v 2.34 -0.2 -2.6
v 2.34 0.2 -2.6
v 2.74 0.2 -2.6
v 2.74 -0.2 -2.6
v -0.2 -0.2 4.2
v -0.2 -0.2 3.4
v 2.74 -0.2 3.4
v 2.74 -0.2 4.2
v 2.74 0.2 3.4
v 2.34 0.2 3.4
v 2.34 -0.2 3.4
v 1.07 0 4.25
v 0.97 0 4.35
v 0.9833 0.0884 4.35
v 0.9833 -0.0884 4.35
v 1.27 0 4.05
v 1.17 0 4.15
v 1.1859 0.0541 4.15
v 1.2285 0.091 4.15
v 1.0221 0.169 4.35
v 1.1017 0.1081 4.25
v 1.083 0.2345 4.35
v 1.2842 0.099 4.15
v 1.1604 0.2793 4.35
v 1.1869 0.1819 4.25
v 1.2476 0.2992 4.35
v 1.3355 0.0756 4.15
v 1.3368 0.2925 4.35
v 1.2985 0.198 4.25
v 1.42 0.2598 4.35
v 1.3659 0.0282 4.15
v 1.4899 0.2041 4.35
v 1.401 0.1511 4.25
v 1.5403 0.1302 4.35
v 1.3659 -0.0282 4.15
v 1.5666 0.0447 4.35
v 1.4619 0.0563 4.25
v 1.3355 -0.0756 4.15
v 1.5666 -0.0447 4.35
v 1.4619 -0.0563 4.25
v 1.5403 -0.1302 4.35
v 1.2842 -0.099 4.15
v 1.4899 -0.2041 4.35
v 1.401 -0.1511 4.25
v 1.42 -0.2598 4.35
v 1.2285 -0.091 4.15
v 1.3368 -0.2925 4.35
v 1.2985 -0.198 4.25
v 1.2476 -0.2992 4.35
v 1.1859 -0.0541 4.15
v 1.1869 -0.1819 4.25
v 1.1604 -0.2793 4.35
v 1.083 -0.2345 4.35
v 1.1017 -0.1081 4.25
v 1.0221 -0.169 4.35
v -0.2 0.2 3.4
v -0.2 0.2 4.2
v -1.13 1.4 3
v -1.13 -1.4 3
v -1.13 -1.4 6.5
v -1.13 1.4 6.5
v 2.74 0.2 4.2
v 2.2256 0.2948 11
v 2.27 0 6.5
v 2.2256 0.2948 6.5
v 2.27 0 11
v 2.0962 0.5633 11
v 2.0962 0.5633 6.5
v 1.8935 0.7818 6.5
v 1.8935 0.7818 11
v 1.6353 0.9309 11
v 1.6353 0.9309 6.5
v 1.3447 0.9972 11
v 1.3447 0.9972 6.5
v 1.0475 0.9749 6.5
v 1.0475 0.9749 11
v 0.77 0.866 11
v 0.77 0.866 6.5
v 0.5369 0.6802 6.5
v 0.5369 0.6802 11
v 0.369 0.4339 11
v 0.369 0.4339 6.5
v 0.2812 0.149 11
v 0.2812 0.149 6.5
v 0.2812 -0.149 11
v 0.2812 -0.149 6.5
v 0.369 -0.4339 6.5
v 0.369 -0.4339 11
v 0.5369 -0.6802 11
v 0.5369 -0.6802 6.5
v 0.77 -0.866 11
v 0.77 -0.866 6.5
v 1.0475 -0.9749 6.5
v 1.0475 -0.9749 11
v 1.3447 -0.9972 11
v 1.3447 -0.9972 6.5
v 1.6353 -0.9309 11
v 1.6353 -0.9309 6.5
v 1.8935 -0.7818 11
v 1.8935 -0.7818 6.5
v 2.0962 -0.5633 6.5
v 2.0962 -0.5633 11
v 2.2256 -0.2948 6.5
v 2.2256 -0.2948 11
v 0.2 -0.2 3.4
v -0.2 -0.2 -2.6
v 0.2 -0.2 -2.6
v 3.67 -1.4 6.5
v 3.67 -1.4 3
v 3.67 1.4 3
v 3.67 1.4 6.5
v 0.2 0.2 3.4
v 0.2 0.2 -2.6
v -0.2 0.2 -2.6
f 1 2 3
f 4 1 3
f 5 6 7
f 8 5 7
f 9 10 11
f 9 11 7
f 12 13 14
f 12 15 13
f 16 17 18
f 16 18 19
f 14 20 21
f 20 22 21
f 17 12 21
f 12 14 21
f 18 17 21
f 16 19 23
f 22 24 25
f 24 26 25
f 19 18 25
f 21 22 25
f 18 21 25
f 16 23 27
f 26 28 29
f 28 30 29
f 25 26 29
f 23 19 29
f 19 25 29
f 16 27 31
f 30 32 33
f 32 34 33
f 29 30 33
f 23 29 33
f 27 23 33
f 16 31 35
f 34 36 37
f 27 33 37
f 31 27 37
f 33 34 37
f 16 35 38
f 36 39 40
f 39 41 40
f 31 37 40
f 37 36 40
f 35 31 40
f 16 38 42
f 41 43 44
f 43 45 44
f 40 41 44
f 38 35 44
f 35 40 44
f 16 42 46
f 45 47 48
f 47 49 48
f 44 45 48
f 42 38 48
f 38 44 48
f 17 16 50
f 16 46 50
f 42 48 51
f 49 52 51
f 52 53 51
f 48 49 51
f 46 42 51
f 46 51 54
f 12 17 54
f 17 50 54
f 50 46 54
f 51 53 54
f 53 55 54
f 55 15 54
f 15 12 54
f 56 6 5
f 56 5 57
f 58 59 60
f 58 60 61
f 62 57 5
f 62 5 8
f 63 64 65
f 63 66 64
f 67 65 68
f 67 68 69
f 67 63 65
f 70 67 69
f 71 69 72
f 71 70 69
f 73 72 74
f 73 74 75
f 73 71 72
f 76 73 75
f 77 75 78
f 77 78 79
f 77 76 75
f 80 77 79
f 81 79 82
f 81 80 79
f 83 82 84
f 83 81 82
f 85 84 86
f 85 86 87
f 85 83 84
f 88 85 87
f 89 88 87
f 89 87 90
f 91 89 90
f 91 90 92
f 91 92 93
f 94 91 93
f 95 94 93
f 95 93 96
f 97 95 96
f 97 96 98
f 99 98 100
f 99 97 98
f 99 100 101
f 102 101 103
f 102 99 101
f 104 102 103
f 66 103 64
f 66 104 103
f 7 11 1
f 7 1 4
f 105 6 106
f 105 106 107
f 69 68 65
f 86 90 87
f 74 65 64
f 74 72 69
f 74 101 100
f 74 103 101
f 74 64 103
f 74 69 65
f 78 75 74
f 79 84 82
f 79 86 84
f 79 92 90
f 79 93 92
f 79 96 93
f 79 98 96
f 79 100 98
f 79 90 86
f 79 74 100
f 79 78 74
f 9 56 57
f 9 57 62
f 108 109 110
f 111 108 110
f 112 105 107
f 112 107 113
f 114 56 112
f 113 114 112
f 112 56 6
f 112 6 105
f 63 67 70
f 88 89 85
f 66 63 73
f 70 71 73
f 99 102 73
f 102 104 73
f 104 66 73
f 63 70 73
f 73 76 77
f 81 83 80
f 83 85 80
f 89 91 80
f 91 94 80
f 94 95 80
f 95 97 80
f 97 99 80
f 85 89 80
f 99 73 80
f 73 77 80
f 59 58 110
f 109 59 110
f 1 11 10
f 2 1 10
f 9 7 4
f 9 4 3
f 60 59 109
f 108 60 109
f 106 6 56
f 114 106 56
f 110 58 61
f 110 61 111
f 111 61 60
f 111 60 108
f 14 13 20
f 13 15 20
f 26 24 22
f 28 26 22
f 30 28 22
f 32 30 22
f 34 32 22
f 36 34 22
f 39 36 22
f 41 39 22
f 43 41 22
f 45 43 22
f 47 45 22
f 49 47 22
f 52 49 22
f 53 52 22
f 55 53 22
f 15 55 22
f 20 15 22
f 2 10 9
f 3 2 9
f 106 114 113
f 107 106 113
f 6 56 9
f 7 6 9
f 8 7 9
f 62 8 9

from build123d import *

# Parameters (mm, degrees)
SKETCH_W     = 1
SKETCH_H     = 4.5
SKETCH001_W  = 4.8
SKETCH001_H  = 2.8
PAD_DEPTH    = 3.5
SKETCH002_W  = 0.4
SKETCH002_H  = 0.4
PAD001_DEPTH = 6
SKETCH003_W  = 2.94
SKETCH003_H  = 0.4
PAD002_DEPTH = 0.8


with BuildPart() as revolution:
    # Sketch → Revolution (revolve)
    with BuildSketch(Plane(origin=(1.27, 0, 0), x_dir=(1, 0, 0), z_dir=(0, -1, 0))):
        with Locations((0.5, 8.75)):
            Rectangle(SKETCH_W, SKETCH_H)
    revolve(axis=Axis((1.27, 0, 0), (0, 0, 1)))


with BuildPart() as pad:
    # Sketch001 → Pad (new body)
    with BuildSketch(Plane(origin=(1.27, 0, 3), x_dir=(1, 0, 0), z_dir=(0, 0, 1))):
        Rectangle(SKETCH001_W, SKETCH001_H)
    extrude(amount=PAD_DEPTH)


with BuildPart() as pad001:
    # Sketch002 → Pad001 (new body)
    with BuildSketch(Plane.XY.offset(3.4)):
        Rectangle(SKETCH002_W, SKETCH002_H)
        with Locations((2.54, 0)):
            Rectangle(SKETCH002_W, SKETCH002_H)
    extrude(amount=-PAD001_DEPTH)


with BuildPart() as pad002:
    # Sketch003 → Pad002 (new body)
    with BuildSketch(Plane.XY.offset(3.4)):
        with Locations((1.27, 0)):
            Rectangle(SKETCH003_W, SKETCH003_H)
    extrude(amount=PAD002_DEPTH)


with BuildPart() as revolution001:
    # Sketch004 → Revolution001 (revolve)
    with BuildSketch(Plane.XZ):
        Polygon((1.27, 4.05), (0.97, 4.35), (1.27, 4.35), align=None)
    revolve(axis=Axis((1.27, 0, 5.374987), (0, 0, -1)))


solid = Compound([revolution.part, pad.part, pad001.part, pad002.part, revolution001.part])
